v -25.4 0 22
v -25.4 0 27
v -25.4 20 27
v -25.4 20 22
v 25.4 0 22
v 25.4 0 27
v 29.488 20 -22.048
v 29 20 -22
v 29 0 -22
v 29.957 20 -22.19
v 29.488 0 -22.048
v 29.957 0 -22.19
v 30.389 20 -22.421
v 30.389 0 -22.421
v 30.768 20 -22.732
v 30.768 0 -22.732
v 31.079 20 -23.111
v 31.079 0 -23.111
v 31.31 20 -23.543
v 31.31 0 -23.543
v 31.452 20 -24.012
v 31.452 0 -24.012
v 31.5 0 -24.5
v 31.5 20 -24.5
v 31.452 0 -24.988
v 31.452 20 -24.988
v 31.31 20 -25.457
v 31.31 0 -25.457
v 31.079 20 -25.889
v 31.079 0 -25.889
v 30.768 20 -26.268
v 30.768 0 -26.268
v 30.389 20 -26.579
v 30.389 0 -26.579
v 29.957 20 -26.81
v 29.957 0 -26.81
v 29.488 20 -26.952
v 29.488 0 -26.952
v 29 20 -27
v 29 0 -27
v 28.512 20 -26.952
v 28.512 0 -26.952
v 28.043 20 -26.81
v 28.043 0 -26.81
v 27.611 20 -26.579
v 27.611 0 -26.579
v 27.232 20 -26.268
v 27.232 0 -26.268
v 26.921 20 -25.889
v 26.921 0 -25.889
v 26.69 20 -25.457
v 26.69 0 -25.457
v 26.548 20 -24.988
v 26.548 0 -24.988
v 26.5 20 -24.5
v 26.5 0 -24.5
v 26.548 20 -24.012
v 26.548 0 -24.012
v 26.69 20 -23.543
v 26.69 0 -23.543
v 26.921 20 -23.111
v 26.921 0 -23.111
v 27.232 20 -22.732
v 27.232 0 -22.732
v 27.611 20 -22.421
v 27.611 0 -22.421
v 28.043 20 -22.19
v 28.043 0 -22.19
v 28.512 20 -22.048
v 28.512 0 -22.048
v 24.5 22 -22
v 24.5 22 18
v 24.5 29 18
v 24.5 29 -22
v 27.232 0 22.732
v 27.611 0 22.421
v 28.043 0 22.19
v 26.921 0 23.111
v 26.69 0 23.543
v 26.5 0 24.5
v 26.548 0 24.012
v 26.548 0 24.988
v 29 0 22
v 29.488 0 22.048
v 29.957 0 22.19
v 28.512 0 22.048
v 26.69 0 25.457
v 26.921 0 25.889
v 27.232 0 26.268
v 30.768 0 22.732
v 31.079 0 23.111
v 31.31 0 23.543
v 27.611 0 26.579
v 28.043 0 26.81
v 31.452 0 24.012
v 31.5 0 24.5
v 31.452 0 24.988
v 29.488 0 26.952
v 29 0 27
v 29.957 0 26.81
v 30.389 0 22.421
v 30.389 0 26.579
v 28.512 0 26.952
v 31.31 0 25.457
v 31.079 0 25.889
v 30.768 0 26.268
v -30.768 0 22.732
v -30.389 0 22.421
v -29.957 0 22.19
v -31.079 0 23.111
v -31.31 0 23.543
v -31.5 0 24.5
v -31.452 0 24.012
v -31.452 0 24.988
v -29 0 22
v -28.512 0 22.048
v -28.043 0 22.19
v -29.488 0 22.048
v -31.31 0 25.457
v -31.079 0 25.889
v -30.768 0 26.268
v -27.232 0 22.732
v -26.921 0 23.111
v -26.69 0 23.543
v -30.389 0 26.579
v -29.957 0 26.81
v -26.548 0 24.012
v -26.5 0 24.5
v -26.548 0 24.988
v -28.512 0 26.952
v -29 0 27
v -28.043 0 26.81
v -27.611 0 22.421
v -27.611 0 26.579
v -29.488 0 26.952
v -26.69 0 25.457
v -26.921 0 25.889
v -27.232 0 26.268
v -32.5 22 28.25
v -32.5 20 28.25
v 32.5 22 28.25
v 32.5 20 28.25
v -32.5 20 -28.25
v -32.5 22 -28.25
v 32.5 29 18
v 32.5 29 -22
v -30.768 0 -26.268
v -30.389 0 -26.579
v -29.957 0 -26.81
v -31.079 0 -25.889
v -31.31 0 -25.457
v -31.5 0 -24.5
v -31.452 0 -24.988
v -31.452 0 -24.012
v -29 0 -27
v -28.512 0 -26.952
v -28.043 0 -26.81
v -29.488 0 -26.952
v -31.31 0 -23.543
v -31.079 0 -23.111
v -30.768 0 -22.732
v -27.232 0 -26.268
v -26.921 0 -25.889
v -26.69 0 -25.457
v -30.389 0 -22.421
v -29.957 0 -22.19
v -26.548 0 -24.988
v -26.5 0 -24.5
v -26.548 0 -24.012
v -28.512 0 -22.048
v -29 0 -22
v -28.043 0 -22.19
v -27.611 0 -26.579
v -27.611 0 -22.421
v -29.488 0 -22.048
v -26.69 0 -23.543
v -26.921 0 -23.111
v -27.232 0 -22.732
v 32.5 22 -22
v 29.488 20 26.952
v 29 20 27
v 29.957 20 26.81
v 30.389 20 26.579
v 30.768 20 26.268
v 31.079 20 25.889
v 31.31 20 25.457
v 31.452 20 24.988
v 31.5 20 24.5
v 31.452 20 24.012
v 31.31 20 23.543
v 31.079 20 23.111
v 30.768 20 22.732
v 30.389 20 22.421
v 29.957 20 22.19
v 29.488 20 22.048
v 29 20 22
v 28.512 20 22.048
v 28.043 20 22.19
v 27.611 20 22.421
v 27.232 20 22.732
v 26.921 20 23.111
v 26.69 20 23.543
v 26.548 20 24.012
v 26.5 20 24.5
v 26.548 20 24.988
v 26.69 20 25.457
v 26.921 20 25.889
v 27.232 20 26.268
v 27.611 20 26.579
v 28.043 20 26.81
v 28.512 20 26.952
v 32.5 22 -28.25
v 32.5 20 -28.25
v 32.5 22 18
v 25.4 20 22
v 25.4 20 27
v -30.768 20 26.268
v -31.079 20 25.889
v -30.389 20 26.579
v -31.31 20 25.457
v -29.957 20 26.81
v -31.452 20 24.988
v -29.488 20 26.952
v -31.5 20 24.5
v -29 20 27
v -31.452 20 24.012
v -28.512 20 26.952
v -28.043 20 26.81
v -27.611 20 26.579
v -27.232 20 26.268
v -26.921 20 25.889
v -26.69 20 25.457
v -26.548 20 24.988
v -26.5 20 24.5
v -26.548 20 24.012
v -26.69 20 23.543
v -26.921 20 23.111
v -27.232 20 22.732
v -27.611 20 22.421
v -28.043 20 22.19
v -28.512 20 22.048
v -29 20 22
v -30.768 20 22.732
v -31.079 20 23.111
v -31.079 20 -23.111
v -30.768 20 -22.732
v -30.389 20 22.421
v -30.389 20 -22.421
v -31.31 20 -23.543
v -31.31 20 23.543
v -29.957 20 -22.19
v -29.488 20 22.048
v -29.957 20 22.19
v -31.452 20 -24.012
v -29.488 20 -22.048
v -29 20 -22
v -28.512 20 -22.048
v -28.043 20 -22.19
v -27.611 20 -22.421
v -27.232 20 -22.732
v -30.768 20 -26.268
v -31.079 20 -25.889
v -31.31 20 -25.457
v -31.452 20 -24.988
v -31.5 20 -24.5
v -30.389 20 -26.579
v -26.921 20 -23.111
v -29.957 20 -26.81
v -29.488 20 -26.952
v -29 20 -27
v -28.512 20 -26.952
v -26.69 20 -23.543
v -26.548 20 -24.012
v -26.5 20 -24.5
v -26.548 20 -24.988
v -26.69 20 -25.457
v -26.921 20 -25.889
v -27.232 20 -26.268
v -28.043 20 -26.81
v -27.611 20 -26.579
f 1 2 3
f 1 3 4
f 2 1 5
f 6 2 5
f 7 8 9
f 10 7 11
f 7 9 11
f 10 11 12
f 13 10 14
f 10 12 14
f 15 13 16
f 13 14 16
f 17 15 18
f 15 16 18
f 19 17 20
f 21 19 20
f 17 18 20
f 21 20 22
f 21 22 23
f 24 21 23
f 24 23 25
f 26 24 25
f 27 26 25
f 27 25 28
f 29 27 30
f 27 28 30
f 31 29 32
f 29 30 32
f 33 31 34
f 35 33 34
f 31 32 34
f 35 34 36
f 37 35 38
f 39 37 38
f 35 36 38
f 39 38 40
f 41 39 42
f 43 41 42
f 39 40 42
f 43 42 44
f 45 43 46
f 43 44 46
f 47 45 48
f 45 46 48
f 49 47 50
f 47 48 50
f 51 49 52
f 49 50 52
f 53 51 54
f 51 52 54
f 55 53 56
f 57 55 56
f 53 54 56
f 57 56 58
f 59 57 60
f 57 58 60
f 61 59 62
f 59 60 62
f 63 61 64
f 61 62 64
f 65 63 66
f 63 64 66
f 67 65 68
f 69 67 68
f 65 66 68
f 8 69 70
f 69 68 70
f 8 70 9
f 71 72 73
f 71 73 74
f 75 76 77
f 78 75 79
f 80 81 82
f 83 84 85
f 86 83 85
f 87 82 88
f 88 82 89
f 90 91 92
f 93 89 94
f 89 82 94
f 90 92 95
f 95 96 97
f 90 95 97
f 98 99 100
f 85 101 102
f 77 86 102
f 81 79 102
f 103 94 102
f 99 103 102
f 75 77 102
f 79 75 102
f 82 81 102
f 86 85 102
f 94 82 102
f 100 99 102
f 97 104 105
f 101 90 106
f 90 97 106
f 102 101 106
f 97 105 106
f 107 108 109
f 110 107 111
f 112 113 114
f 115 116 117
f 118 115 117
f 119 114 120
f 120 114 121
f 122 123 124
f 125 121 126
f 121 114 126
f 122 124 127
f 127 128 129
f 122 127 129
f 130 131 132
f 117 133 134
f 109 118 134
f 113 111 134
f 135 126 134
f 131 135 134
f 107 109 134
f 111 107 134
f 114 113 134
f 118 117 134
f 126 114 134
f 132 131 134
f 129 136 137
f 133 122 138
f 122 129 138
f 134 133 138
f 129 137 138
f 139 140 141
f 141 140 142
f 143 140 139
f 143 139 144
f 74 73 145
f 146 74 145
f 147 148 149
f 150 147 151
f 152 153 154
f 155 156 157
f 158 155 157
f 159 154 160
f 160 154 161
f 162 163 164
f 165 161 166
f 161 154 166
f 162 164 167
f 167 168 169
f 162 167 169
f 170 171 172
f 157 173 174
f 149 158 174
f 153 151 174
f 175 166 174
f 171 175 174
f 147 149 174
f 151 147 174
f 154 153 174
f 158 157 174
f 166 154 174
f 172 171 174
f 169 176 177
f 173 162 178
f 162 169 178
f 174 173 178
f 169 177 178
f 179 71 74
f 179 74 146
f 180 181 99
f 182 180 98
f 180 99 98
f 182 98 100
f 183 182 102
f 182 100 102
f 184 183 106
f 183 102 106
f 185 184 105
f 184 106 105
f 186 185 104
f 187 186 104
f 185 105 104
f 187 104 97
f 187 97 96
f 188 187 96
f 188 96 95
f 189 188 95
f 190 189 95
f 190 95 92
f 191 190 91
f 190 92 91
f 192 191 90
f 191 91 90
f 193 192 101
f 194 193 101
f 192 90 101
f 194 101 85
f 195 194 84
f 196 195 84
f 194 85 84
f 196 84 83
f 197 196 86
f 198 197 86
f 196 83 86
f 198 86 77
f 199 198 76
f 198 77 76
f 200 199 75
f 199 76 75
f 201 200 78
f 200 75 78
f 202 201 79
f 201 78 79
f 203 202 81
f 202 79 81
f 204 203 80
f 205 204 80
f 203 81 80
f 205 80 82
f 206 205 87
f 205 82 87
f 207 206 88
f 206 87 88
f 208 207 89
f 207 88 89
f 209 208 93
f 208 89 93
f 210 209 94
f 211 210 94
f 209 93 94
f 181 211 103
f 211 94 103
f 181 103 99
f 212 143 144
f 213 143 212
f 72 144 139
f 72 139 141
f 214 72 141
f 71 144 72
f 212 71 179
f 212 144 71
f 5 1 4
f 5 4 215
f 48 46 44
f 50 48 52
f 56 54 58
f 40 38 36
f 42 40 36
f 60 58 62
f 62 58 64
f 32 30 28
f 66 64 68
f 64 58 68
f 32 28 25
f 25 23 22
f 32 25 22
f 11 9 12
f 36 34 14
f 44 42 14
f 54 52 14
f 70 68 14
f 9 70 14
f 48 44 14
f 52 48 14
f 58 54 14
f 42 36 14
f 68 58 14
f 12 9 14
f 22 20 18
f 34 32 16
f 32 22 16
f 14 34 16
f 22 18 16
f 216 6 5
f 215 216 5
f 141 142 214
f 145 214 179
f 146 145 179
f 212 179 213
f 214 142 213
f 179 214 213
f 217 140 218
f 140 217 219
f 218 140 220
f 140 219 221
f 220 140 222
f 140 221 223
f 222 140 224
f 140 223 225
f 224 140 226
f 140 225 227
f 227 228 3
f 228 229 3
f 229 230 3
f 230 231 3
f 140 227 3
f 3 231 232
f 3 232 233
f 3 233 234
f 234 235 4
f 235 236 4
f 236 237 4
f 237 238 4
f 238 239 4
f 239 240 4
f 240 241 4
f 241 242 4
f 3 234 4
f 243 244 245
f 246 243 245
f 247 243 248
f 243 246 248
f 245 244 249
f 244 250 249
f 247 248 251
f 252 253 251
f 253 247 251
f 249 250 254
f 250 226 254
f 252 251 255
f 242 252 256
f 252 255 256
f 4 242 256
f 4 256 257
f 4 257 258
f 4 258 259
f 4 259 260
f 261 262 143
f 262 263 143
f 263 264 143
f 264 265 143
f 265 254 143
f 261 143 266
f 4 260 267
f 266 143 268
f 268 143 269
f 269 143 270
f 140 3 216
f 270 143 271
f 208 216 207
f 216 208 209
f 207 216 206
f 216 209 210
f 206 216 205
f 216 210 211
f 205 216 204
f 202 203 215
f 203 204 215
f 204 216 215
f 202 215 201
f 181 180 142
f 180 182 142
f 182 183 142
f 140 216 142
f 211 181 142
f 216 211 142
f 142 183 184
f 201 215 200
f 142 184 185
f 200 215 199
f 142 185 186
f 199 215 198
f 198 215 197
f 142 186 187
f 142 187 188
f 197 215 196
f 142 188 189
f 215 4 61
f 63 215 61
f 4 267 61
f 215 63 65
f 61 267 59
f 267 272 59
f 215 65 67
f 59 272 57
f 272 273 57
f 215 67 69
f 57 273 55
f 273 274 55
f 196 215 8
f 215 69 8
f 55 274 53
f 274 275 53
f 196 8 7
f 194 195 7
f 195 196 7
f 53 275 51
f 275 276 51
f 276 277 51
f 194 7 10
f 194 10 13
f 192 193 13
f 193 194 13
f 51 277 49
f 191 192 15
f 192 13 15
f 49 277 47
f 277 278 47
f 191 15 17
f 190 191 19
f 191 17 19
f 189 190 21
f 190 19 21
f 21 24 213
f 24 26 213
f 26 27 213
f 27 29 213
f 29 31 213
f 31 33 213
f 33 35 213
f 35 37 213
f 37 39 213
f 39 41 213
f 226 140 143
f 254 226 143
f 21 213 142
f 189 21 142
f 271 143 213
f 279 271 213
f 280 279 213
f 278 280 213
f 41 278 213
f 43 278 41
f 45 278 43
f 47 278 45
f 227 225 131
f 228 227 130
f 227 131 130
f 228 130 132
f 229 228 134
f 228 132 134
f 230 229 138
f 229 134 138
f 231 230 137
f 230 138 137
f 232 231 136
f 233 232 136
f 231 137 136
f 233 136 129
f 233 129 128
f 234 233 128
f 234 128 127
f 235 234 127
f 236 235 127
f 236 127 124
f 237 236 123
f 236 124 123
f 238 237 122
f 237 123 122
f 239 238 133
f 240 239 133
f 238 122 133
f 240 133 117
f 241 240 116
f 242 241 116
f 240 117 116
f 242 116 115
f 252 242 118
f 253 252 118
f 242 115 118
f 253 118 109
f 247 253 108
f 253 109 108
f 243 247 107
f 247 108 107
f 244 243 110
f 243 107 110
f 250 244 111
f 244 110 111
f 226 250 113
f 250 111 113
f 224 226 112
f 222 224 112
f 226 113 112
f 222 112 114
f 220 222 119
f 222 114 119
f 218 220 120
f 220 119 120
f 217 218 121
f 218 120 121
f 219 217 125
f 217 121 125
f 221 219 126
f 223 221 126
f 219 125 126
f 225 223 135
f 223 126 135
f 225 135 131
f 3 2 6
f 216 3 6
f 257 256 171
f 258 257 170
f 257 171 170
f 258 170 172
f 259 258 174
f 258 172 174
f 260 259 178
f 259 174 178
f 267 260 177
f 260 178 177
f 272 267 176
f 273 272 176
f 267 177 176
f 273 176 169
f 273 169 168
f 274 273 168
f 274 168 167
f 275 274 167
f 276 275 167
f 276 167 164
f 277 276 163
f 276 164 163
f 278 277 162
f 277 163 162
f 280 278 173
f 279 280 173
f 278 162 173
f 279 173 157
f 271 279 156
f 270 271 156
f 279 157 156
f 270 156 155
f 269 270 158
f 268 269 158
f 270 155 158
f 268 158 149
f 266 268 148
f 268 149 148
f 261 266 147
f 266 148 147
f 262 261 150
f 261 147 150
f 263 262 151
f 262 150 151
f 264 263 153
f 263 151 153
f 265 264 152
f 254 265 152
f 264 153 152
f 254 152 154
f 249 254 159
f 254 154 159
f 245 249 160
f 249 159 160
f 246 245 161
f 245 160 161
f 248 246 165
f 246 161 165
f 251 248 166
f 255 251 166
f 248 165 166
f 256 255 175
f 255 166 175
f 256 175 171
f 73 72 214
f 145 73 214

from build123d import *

# Parameters (mm, degrees)
SK_P01_STANDOFF_R                  = 2.5
P01_STANDOFF_DEPTH                 = 20
SK_P02_STANDOFF_R                  = 2.5
P02_STANDOFF_DEPTH                 = 20
SK_P03_STANDOFF_R                  = 2.5
P03_STANDOFF_DEPTH                 = 20
SK_P04_STANDOFF_R                  = 2.5
P04_STANDOFF_DEPTH                 = 20
P05_PERMAPROTOHAT35MMFANCUTO_START = 20
SK_P05_PERMAPROTOHAT35MMFANCUTO_W  = 65
SK_P05_PERMAPROTOHAT35MMFANCUTO_H  = 56.5
P05_PERMAPROTOHAT35MMFANCUTO_DEPTH = 2
SK_P06_STACKINGHEADER_W            = 50.8
SK_P06_STACKINGHEADER_H            = 5
P06_STACKINGHEADER_DEPTH           = 20
P07_JSTXHHEADERSVERTICAL_START     = 22
SK_P07_JSTXHHEADERSVERTICAL_W      = 8
SK_P07_JSTXHHEADERSVERTICAL_H      = 40
P07_JSTXHHEADERSVERTICAL_DEPTH     = 7


with BuildPart() as part:
    # SK_P01_Standoff → P01_Standoff (new body)
    with BuildSketch(Plane(origin=(0, 0, 0), x_dir=(1, 0, 0), z_dir=(0, 1, 0))):
        with Locations(Location((-29, 24.5, 0), (0, 0, 270))):
            Circle(SK_P01_STANDOFF_R)
    extrude(amount=P01_STANDOFF_DEPTH)



with BuildPart() as body_2:
    # SK_P02_Standoff → P02_Standoff (new body)
    with BuildSketch(Plane(origin=(0, 0, 0), x_dir=(1, 0, 0), z_dir=(0, 1, 0))):
        with Locations(Location((-29, -24.5, 0), (0, 0, 270))):
            Circle(SK_P02_STANDOFF_R)
    extrude(amount=P02_STANDOFF_DEPTH)


with BuildPart() as body_3:
    # SK_P03_Standoff → P03_Standoff (new body)
    with BuildSketch(Plane(origin=(0, 0, 0), x_dir=(1, 0, 0), z_dir=(0, 1, 0))):
        with Locations(Location((29, 24.5, 0), (0, 0, 270))):
            Circle(SK_P03_STANDOFF_R)
    extrude(amount=P03_STANDOFF_DEPTH)


with BuildPart() as body_4:
    # SK_P04_Standoff → P04_Standoff (new body)
    with BuildSketch(Plane(origin=(0, 0, 0), x_dir=(1, 0, 0), z_dir=(0, 1, 0))):
        with Locations(Location((29, -24.5, 0), (0, 0, 270))):
            Circle(SK_P04_STANDOFF_R)
    extrude(amount=P04_STANDOFF_DEPTH)


with BuildPart() as part_1:
    add(part.part)

    add(body_2.part)  # P05_PermaProtoHAT35mmfancuto merges body 2

    add(body_3.part)  # P05_PermaProtoHAT35mmfancuto merges body 3

    add(body_4.part)  # P05_PermaProtoHAT35mmfancuto merges body 4
    # SK_P05_PermaProtoHAT35mmfancuto → P05_PermaProtoHAT35mmfancuto (add)
    with BuildSketch(Plane(origin=(0, 0, 0), x_dir=(1, 0, 0), z_dir=(0, 1, 0)).offset(P05_PERMAPROTOHAT35MMFANCUTO_START)):
        Rectangle(SK_P05_PERMAPROTOHAT35MMFANCUTO_W, SK_P05_PERMAPROTOHAT35MMFANCUTO_H)
    extrude(amount=P05_PERMAPROTOHAT35MMFANCUTO_DEPTH)

    # SK_P06_Stackingheader → P06_Stackingheader (add)
    with BuildSketch(Plane(origin=(0, 0, 0), x_dir=(1, 0, 0), z_dir=(0, 1, 0))):
        with Locations((0, -24.5)):
            Rectangle(SK_P06_STACKINGHEADER_W, SK_P06_STACKINGHEADER_H)
    extrude(amount=P06_STACKINGHEADER_DEPTH)

    # SK_P07_JSTXHheadersvertical → P07_JSTXHheadersvertical (add)
    with BuildSketch(Plane(origin=(0, 0, 0), x_dir=(1, 0, 0), z_dir=(0, 1, 0)).offset(P07_JSTXHHEADERSVERTICAL_START)):
        with Locations((28.5, 2)):
            Rectangle(SK_P07_JSTXHHEADERSVERTICAL_W, SK_P07_JSTXHHEADERSVERTICAL_H)
    extrude(amount=P07_JSTXHHEADERSVERTICAL_DEPTH)


solid = part_1.part
